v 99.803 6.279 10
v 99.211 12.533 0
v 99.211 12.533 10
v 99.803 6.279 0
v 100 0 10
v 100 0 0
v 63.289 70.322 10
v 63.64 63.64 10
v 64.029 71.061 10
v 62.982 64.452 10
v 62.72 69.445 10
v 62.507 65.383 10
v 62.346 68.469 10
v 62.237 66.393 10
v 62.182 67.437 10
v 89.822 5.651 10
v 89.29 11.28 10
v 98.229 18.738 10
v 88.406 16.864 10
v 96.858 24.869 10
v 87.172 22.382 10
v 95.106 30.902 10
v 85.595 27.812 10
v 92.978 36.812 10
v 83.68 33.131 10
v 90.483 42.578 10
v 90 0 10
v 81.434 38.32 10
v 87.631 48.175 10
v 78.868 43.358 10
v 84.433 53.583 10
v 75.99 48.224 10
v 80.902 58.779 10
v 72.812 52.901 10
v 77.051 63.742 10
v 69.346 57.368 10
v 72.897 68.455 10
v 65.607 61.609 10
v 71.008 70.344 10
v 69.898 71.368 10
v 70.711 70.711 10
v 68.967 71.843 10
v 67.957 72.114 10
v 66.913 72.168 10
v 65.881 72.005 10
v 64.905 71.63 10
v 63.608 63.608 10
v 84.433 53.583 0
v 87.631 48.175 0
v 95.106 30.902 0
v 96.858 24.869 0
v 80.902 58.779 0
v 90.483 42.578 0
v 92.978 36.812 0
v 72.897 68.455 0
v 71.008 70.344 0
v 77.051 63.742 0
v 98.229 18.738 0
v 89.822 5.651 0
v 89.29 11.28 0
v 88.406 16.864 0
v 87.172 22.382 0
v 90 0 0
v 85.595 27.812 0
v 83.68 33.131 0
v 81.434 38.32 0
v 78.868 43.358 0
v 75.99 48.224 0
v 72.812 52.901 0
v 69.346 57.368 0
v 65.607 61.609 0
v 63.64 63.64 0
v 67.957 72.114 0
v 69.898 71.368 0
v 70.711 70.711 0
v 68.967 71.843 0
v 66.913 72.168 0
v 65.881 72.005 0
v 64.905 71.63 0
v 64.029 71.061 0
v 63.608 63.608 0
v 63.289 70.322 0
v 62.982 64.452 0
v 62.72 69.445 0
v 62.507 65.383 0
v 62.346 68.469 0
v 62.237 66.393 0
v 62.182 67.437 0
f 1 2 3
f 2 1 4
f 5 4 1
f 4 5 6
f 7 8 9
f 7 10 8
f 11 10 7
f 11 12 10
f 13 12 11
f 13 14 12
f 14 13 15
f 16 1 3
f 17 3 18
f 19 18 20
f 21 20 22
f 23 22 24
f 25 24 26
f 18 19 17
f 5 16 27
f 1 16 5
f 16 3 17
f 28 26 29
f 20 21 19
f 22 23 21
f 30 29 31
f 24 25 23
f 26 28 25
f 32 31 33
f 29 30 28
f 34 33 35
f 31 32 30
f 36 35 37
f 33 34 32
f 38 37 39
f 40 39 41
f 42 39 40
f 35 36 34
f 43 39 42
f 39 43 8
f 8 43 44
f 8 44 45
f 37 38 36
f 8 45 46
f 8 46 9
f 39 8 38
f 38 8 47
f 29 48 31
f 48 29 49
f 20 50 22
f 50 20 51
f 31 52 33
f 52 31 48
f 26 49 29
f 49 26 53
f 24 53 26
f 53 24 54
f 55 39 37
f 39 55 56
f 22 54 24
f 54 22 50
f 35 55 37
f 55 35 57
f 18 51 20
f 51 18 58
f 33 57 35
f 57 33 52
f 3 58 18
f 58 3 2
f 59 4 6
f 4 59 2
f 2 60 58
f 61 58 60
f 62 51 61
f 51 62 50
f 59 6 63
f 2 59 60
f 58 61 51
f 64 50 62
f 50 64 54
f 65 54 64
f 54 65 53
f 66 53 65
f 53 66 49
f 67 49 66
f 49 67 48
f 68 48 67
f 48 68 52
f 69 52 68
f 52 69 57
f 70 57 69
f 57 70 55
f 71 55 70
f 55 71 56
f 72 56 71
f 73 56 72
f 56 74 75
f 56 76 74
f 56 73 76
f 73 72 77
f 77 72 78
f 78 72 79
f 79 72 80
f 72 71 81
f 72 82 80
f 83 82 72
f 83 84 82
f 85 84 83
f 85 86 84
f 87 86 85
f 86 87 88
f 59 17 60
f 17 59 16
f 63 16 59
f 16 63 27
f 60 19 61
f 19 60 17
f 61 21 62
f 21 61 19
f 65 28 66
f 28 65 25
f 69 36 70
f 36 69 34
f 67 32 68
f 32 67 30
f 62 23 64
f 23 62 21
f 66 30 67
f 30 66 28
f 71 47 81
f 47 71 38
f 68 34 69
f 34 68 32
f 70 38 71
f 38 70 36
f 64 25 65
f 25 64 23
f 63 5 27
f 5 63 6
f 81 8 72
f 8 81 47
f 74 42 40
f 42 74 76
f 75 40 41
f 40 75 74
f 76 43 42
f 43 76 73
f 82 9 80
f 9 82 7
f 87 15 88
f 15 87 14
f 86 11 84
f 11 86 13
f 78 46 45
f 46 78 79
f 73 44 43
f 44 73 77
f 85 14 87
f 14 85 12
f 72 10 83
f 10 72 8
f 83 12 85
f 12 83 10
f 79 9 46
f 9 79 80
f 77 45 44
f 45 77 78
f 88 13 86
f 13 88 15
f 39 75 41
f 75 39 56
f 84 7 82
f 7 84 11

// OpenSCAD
// file: config.scad
// Author: Mihai Oltean, www.tcreate.org, mihai.oltean@gmail.com
// More details: jenny5.org
// Source: github.com/jenny5-robot
// MIT License
//--------------------------------------------------------------

aluminium_color = "Silver";
screw_color = "LightSlateGray";
frame_color = aluminium_color;
shaft_color = "Silver";
plastic_color = "LimeGreen";
pulley_color = "DarkSlateGray";
// file: utils.scad
// Author: Mihai Oltean, www.tcreate.org, mihai.oltean@gmail.com
// More details: jenny5.org
// Source: github.com/jenny5-robot
// MIT License
//--------------------------------------------------------------

module colt(radius, height)
{
	difference(){
		cube ([radius, radius, height]);
		cylinder	(h = height, r = radius, $fn = 30);
	}
}
/////////////////////////////////////////////////////////////////////////////////////////////////////////////////////////
module colt_sferic(radius)
{
	difference(){
		cube ([radius, radius, radius]);
		sphere(r = radius, $fn = 40);
	}
}
/////////////////////////////////////////////////////////////////////////////////////////////////////////////////////////
module coloana_sferica(height, radius)
{
		difference(){
			cube ([height, height, height]);
			cylinder(h= height, r = radius, $fn = 50);
		}
}
/////////////////////////////////////////////////////////////////////////////////////////////////////////////////////////
// file: params_screws_nuts_washers.scad
// Author: Mihai Oltean, www.tcreate.org, mihai.oltean@gmail.com
// More details: jenny5.org
// Source: github.com/jenny5-robot
// MIT License
//--------------------------------------------------------------


m2_screw_radius = 1;
m2_nut_radius = 2.2;
m2_nut_height = 1.6;
m2_nut_thick = m2_nut_height;

m3_screw_radius = 1.5;
m3_nut_radius = 3.1;
m3_nut_height = 2.3;
m3_nut_thick = m3_nut_height;
m3_autolock_nut_thick = 4.2;

m4_screw_radius = 2;
m4_nut_radius = 4;
m4_auto_lock_nut_height = 5;
m4_nut_height = 3.25;
m4_nut_thick = 3.25;

m5_screw_radius = 2.5;
m5_nut_radius = 4.6;
m5_nut_height = 4;

m6_screw_radius = 3;
m6_nut_radius = 5.65;
m6_nut_thick = 5;
m6_nut_slim_thick = 3;
m6_autolock_nut_thick = 6;
m6_long_nut_thick = 9;

m8_screw_head_height = 5.7;
m8_screw_radius = 3.9;
m8_nut_small_width = 12.8;
m8_nut_radius = 7.3;
m8_slim_nut_small_width = 12.4;
m8_nut_thick = 6.5;
m8_nut_height = m8_nut_thick;
m8_slim_nut_height = 5.5;
m8_screw_head_radius = 6.5;
m8_autolock_nut_thick = 8;

m10_screw_radius = 5;
m10_nut_thick = 8;
m10_nut_radius = 9.8;

M12_screw_radius = 6;
M12_nut_thick = 8;
M12_nut_radius = 11;
M12_long_long_nut_thick = 36;
M12_long_nut_thick = 36;
M12_autolock_nut_thick = 14;

m10_long_nut_radius = 9.71;
m10_long_nut_height = 29.8;

m10_long_thick_nut_radius = 7.41;
m10_long_thick_nut_height = 30.4;

m12_plastic_nut_radius = 10.45;
m12_plastic_nut_height = 23.3;

tr12_3_nut_radius = 11;
tr12_3_nut_height = 18.1;

washer_5 = 0.97;

washer_4_12_radius = 6;
washer_4_12_external_radius = 6;
washer_4_12_thick = 1;
washer_4_thick = 1;
washer_4_12_internal_radius = 2.15;

washer_4_9_external_radius = 4.5;
washer_4_9_internal_radius = 2.15;
washer_4_9_thick = 1;

washer_6_thick = 1.7;
washer_8_thick = 1.5;
washer_5_thick = 1;

washer_10_height = 2;
washer_10_thick = 2;

washer_12_thick = 2;

washer_5_15_external_radius = 7.5;
washer_5_15_thick = 1;
washer_5_thick = 1;
washer_5_15_internal_radius = 2.65;
// file: params_basic_components.scad
// Author: Mihai Oltean, www.tcreate.org, mihai.oltean@gmail.com
// More details: jenny5.org
// Source: github.com/jenny5-robot
// MIT License
//--------------------------------------------------------------

spring_length = 20;

smooth_rod_8_radius = 4;
smooth_rod_10_radius = 5;
smooth_rod_12_radius = 6;

tolerance = 0.1;
display_tolerance = 1;

overlap_tolerance = 0.01;

wall_thick_1 = 1;
wall_thick_2 = 2;
wall_thick_3 = 3;
wall_thick_4 = 4;
wall_thick_5 = 5;
wall_thick_5_5 = 5.5;
wall_thick_6 = 6;
wall_thick_7 = 7;
wall_thick_8 = 8;
wall_thick_9 = 9;
wall_thick_10 = 10;
wall_thick_12 = 10;

tolerance_z = [0, 0, tolerance];
tolerance_x = [tolerance, 0, 0];
tolerance_y = [0, tolerance, 0];

display_tolerance_z = [0, 0, display_tolerance];
display_tolerance_x = [display_tolerance, 0, 0];
display_tolerance_y = [0, display_tolerance, 0];

display_tolerance_xz = [display_tolerance, 0, display_tolerance];
display_tolerance_xy = [display_tolerance, display_tolerance, 0];
display_tolerance_yz = [0, display_tolerance, display_tolerance];

display_tolerance_xyz = [display_tolerance, display_tolerance, display_tolerance];
// main file
// Author: Mihai Oltean, www.tcreate.org, mihai.oltean@gmail.com
// More details: jenny5.org
// Source: github.com/jenny5-robot
// MIT License
//--------------------------------------------------------------

include <params_basic_components.scad>
include <../basic_scad/params_screws_nuts_washers.scad>
use <../basic_scad/utils.scad>

include <config.scad>


//--------------------------------------------------------------
module my_cube_rounded(length, width, height)
{
	radius = 3;

	if (height > radius){
		difference(){
			cube([length, width, height]);
			translate ([length - radius+tolerance, width - radius+tolerance, 0] - tolerance_z) coloana_sferica(height + 2 * tolerance, 3);
			translate ([radius - tolerance, width - radius+tolerance, 0] - tolerance_z) rotate ([0, 0, 90]) coloana_sferica(height + 2 * tolerance, 3);
			translate ([length - radius+tolerance, radius - tolerance, 0] - tolerance_z) rotate ([0, 0, -90]) coloana_sferica(height + 2 * tolerance, 3);
			translate ([radius-tolerance, radius - tolerance, 0] - tolerance_z) rotate ([0, 0, 180]) coloana_sferica(height + 2 * tolerance, 3);
		}	
	}
	else{
		difference(){
			cube([length, width, height]);
			translate ([length - height + tolerance, width - height + tolerance, 0] - tolerance_z) coloana_sferica(height + 2 * tolerance, height);
			translate ([height - tolerance, width - height+tolerance, 0] - tolerance_z) rotate ([0, 0, 90]) coloana_sferica(height + 2 * tolerance, height);
			translate ([length - height+tolerance, height - tolerance, 0] - tolerance_z) rotate ([0, 0, -90]) coloana_sferica(height + 2 * tolerance, height);
			translate ([height-tolerance, height - tolerance, 0] - tolerance_z) rotate ([0, 0, 180]) coloana_sferica(height + 2 * tolerance, height);
		}	
	}
}
//--------------------------------------------------------------
module my_cube_rounded2(cube_sizes)
{
	radius = 3;

	if (cube_sizes[2] > radius){
		difference(){
			cube(cube_sizes);
			translate ([cube_sizes[0] - radius + tolerance, cube_sizes[1] - radius + tolerance, 0] - tolerance_z) coloana_sferica(cube_sizes[2] + 2 * tolerance, 3);
			translate ([radius - tolerance, cube_sizes[1] - radius + tolerance, 0] - tolerance_z) rotate ([0, 0, 90]) coloana_sferica(cube_sizes[2] + 2 * tolerance, 3);
			translate ([cube_sizes[0] - radius + tolerance, radius - tolerance, 0] - tolerance_z) rotate ([0, 0, -90]) coloana_sferica(cube_sizes[2] + 2 * tolerance, 3);
			translate ([radius-tolerance, radius - tolerance, 0] - tolerance_z) rotate ([0, 0, 180]) coloana_sferica(cube_sizes[2] + 2 * tolerance, 3);
		}	
	}
	else{
		difference(){
			cube(cube_sizes);
			translate ([cube_sizes[0] - cube_sizes[2] + tolerance, cube_sizes[1] - cube_sizes[2] + tolerance, 0] - tolerance_z) coloana_sferica(cube_sizes[2] + 2 * tolerance, cube_sizes[2]);
			translate ([cube_sizes[2] - tolerance, cube_sizes[1] - cube_sizes[2]+tolerance, 0] - tolerance_z) rotate ([0, 0, 90]) coloana_sferica(cube_sizes[2] + 2 * tolerance, cube_sizes[2]);
			translate ([cube_sizes[0] - cube_sizes[2]+tolerance, cube_sizes[2] - tolerance, 0] - tolerance_z) rotate ([0, 0, -90]) coloana_sferica(cube_sizes[2] + 2 * tolerance, cube_sizes[2]);
			translate ([cube_sizes[2]-tolerance, cube_sizes[2] - tolerance, 0] - tolerance_z) rotate ([0, 0, 180]) coloana_sferica(cube_sizes[2] + 2 * tolerance, cube_sizes[2]);
		}	
	}
}
//--------------------------------------------------------------
module my_cube_rounded2_strengthen(cube_sizes, strength_h = 2, strength_w = 2)
{
	radius = 3;
    
    

	if (cube_sizes[2] > radius){
		difference(){
			cube([cube_sizes[0], cube_sizes[1], cube_sizes[2] + strength_h]);
			translate ([0, strength_w, cube_sizes[2]]) cube([cube_sizes[0], cube_sizes[1] - 2 * strength_w, strength_h + 1]);
            
			translate ([cube_sizes[0] - radius + tolerance, cube_sizes[1] - radius + tolerance, 0] - tolerance_z) coloana_sferica(cube_sizes[2] + strength_h + 2 * tolerance, 3);
			translate ([radius - tolerance, cube_sizes[1] - radius + tolerance, 0] - tolerance_z) rotate ([0, 0, 90]) coloana_sferica(cube_sizes[2] + strength_h + 2 * tolerance, 3);
			translate ([cube_sizes[0] - radius + tolerance, radius - tolerance, 0] - tolerance_z) rotate ([0, 0, -90]) coloana_sferica(cube_sizes[2] + strength_h + 2 * tolerance, 3);
			translate ([radius-tolerance, radius - tolerance, 0] - tolerance_z) rotate ([0, 0, 180]) coloana_sferica(cube_sizes[2] + strength_h + 2 * tolerance, 3);
		}	
	}
	else{
		difference(){
			cube([cube_sizes[0], cube_sizes[1], cube_sizes[2] + strength_h]);
            translate ([0, strength_w, cube_sizes[2]]) cube([cube_sizes[0], cube_sizes[1] - 2 * strength_w, strength_h + 1]);
            
			translate ([cube_sizes[0] - cube_sizes[2] + tolerance, cube_sizes[1] - cube_sizes[2] + tolerance, 0] - tolerance_z) coloana_sferica(cube_sizes[2] + strength_h + 2 * tolerance, cube_sizes[2]);
			translate ([cube_sizes[2] - tolerance, cube_sizes[1] - cube_sizes[2]+tolerance, 0] - tolerance_z) rotate ([0, 0, 90]) coloana_sferica(cube_sizes[2] + strength_h + 2 * tolerance, cube_sizes[2]);
			translate ([cube_sizes[0] - cube_sizes[2]+tolerance, cube_sizes[2] - tolerance, 0] - tolerance_z) rotate ([0, 0, -90]) coloana_sferica(cube_sizes[2] + strength_h + 2 * tolerance, cube_sizes[2]);
			translate ([cube_sizes[2]-tolerance, cube_sizes[2] - tolerance, 0] - tolerance_z) rotate ([0, 0, 180]) coloana_sferica(cube_sizes[2] + strength_h + 2 * tolerance, cube_sizes[2]);
		}	
	}
}
//--------------------------------------------------------------
module my_cube_rounded3_x(cube_sizes)
{
 translate ([cube_sizes[1] / 2, 0, 0]) cube([cube_sizes[0] - cube_sizes[1], cube_sizes[1], cube_sizes[2]]);
    translate ([cube_sizes[1] / 2, cube_sizes[1] / 2, 0]) cylinder (h = cube_sizes[2] , r = cube_sizes[1] / 2, $fn = 50);
    translate ([cube_sizes[0] - cube_sizes[1] / 2, cube_sizes[1] / 2, 0]) cylinder (h = cube_sizes[2] , r = cube_sizes[1] / 2, $fn = 50);
}
//--------------------------------------------------------------
module my_cube_rounded_opuse(length, width, height, radius)
{

	if (height > radius){
		difference(){
			cube([length, width, height]);
			translate ([length - radius+tolerance, width - radius+tolerance, 0] - tolerance_z) coloana_sferica(height + 2 * tolerance, radius);
//			translate ([radius - tolerance, width - radius+tolerance, 0]) rotate ([0, 0, 90]) coloana_sferica(height, 3);
//			translate ([length - radius+tolerance, radius - tolerance, 0]) rotate ([0, 0, -90]) coloana_sferica(height, 3);
			translate ([radius-tolerance, radius - tolerance, 0] - tolerance_z) rotate ([0, 0, 180]) coloana_sferica(height + 2 * tolerance, radius);
		}	
	}
	else{
		difference(){
			cube([length, width, height]);
			translate ([length - height + tolerance, width - height + tolerance, 0] - tolerance_z) coloana_sferica(height + 2 * tolerance, height);
//			translate ([height - tolerance, width - height+tolerance, 0]) rotate ([0, 0, 90]) coloana_sferica(height, height);
//			translate ([length - height+tolerance, height - tolerance, 0]) rotate ([0, 0, -90]) coloana_sferica(height, height);
			translate ([height-tolerance, height - tolerance, 0] - tolerance_z) rotate ([0, 0, 180]) coloana_sferica(height + 2 * tolerance, height);
		}	
	}
}
//----------------------------------------------------------------
module cube_rounded_x_holed_z(cube_size, hole_radius)
{
    difference(){
        hull(){
            translate ([0, cube_size[2] / 2, cube_size[2] / 2]) rotate([0, 90, 0]) cylinder (h = cube_size[0], r = cube_size[2] / 2, $fn = 30);
            translate ([0, -cube_size[2] / 2 + cube_size[1], cube_size[2] / 2]) rotate([0, 90, 0]) cylinder (h = cube_size[0], r = cube_size[2] / 2, $fn = 30);
        }
        translate ([cube_size[0] / 2, cube_size[1] / 2, 0] - display_tolerance_z) cylinder (h = cube_size[2] + 2 * display_tolerance, r = hole_radius);
    }
}
//----------------------------------------------------------------
module teava_dreptunghiulara(lungime, latime, grosime_perete, inaltime)
{
    difference(){
		cube([lungime, latime, inaltime]);
		translate ([grosime_perete, grosime_perete, 0]- display_tolerance_z) cube([lungime - 2 * grosime_perete, latime - 2 * grosime_perete, inaltime + 2 * display_tolerance]);
	}
}
//--------------------------------------------------------------
module cube_empty(latura_interioara, latura_exterioara, inaltime)
{
	difference(){
		translate ([-latura_exterioara / 2, - latura_exterioara / 2, 0]) cube([latura_exterioara, latura_exterioara, inaltime]);
		translate ([- latura_interioara / 2, - latura_interioara / 2, 0] - display_tolerance_z) cube([latura_interioara, latura_interioara, inaltime + 2 * display_tolerance]);
	}
}
//--------------------------------------------------------------
module cylinder_empty(_h, external_radius, internal_radius, fn = 30)
{
	difference(){
		cylinder ( h = _h, r = external_radius, $fn = fn);
		translate ([0, 0, - display_tolerance]) cylinder ( h = _h + 2 * display_tolerance, r = internal_radius, $fn = fn);
	}
}
//--------------------------------------------------------------
module U(length, base, height, grosime_perete)
{
    //render(){
        difference(){
            cube ([length, base, height]);
            translate ([-display_tolerance, grosime_perete, grosime_perete]) cube ([length + 2 * display_tolerance, base - 2 * grosime_perete, height - grosime_perete + display_tolerance]);
        }
    //}
}
//--------------------------------------------------------------
module L(length, edge_1_width = 20, edge_2_width = 20, wall_thick = 3)
{
   
  difference(){
    cube ([edge_2_width, length, edge_1_width]);
    translate ([wall_thick, 0, wall_thick] - display_tolerance_y) cube ([edge_2_width - wall_thick, length, edge_1_width - wall_thick] + display_tolerance_xyz + display_tolerance_y);
  }
    
}
//--------------------------------------------------------------
module heat_sink(external_radius, internal_radius, number_of_wings)
{
	heatsink_wing_height = 1;
	difference(){
		union(){
			cylinder ( h = heatsink_wing_height, r = external_radius, $fn = 50);
			for (i = [1:number_of_wings - 1]){
				translate ([0, 0, (2 * i - 1) * heatsink_wing_height]) cylinder ( h = heatsink_wing_height, r = internal_radius + 1, $fn = 50);
				translate ([0, 0, 2 * i * heatsink_wing_height]) cylinder ( h = heatsink_wing_height, r = external_radius, $fn = 50);
			}
		}
		translate ([0, 0, -tolerance]) cylinder ( h = (2 * number_of_wings  - 1) * heatsink_wing_height + 2 * tolerance, r = internal_radius, $fn = 50);
	}
}
//--------------------------------------------------------------
module half_cylinder(_h, _r, _fn)
{
    difference(){
        cylinder (h = _h, r = _r, $fn = _fn);
        translate ([-_r, -_r, 0] - display_tolerance_z)cube([_r, 2 * _r, _h + 2 * display_tolerance]);
    }
}

//--------------------------------------------------------------
module half_box(size_x, size_y, size_z, wall_thick_x, wall_thick_y, wall_thick_z)
{
    difference(){
      cube([size_x, size_y, size_z]); 
      translate ([wall_thick_x, 0, wall_thick_z] - display_tolerance_y) cube([size_x - 2 * wall_thick_x, size_y - wall_thick_y, size_z - wall_thick_z] + display_tolerance_yz); 
        translate([0, 0, wall_thick_z] - display_tolerance_x) rotate([atan((size_z - wall_thick_z) / (size_y - wall_thick_y)), 0, 0]) cube([size_x, 2 *size_y, size_z] + 2 * display_tolerance_x); 
    }
}
//--------------------------------------------------------------
module corner(length, width, height, wall_thick)
{
    difference(){
        cube([length, width, height]);
        translate ([wall_thick, wall_thick, wall_thick]) cube([length - wall_thick, width - wall_thick, height - wall_thick] + display_tolerance_xyz);
    }
}
//--------------------------------------------------------------
module arc_thick(radius_exterior = 100, radius_interior = 90, thick = 10, angle = 90)
{
    intersection(){
        difference(){
            cylinder(h = thick, r = radius_exterior);
            translate (-display_tolerance_z) cylinder(h = thick + 2 * display_tolerance, r = radius_interior);
        }
        cube([radius_exterior, radius_exterior, thick]);
        rotate(angle - 90) cube([radius_exterior, radius_exterior, thick]);
    }
}
//--------------------------------------------------------------
module arc_thick_rounded(radius_exterior = 100, radius_interior = 90, thick = 10, angle = 90)
{
    intersection(){
        difference(){
            cylinder(h = thick, r = radius_exterior, $fn = 100);
            translate (-display_tolerance_z) cylinder(h = thick + 2 * display_tolerance, r = radius_interior, $fn = 100);
        }
        cube([radius_exterior, radius_exterior, thick]);
        rotate(angle - 90) cube([radius_exterior, radius_exterior, thick]);
    }
    rotate ([0, 0, angle]) translate([(radius_exterior + radius_interior) / 2, 0, 0]) cylinder (h = thick, r = (radius_exterior - radius_interior) / 2, $fn = 30);
}
//--------------------------------------------------------------

arc_thick_rounded(angle = 45);

//corner(40, 20, 30, 3);

//cube_rounded_x_holed_z([60, 40, 10], 10);

//half_box(100, 50, 30, 2, 3, 3);
//U(400, 40, 40, 3);

//L(100);

//hexa_screw(m6_screw_radius, 60, m6_nut_radius, m6_nut_thick);

//sunken_screw(m6_screw_radius, 60, m6_nut_radius, m6_nut_thick);

//inbus_screw(m8_screw_radius, 40, m8_nut_radius, m8_nut_thick);

//screw(m8_screw_radius, 40, m8_nut_radius, m8_nut_thick);

//nut_fluture(m4_screw_radius, m4_nut_radius, m4_nut_height);
